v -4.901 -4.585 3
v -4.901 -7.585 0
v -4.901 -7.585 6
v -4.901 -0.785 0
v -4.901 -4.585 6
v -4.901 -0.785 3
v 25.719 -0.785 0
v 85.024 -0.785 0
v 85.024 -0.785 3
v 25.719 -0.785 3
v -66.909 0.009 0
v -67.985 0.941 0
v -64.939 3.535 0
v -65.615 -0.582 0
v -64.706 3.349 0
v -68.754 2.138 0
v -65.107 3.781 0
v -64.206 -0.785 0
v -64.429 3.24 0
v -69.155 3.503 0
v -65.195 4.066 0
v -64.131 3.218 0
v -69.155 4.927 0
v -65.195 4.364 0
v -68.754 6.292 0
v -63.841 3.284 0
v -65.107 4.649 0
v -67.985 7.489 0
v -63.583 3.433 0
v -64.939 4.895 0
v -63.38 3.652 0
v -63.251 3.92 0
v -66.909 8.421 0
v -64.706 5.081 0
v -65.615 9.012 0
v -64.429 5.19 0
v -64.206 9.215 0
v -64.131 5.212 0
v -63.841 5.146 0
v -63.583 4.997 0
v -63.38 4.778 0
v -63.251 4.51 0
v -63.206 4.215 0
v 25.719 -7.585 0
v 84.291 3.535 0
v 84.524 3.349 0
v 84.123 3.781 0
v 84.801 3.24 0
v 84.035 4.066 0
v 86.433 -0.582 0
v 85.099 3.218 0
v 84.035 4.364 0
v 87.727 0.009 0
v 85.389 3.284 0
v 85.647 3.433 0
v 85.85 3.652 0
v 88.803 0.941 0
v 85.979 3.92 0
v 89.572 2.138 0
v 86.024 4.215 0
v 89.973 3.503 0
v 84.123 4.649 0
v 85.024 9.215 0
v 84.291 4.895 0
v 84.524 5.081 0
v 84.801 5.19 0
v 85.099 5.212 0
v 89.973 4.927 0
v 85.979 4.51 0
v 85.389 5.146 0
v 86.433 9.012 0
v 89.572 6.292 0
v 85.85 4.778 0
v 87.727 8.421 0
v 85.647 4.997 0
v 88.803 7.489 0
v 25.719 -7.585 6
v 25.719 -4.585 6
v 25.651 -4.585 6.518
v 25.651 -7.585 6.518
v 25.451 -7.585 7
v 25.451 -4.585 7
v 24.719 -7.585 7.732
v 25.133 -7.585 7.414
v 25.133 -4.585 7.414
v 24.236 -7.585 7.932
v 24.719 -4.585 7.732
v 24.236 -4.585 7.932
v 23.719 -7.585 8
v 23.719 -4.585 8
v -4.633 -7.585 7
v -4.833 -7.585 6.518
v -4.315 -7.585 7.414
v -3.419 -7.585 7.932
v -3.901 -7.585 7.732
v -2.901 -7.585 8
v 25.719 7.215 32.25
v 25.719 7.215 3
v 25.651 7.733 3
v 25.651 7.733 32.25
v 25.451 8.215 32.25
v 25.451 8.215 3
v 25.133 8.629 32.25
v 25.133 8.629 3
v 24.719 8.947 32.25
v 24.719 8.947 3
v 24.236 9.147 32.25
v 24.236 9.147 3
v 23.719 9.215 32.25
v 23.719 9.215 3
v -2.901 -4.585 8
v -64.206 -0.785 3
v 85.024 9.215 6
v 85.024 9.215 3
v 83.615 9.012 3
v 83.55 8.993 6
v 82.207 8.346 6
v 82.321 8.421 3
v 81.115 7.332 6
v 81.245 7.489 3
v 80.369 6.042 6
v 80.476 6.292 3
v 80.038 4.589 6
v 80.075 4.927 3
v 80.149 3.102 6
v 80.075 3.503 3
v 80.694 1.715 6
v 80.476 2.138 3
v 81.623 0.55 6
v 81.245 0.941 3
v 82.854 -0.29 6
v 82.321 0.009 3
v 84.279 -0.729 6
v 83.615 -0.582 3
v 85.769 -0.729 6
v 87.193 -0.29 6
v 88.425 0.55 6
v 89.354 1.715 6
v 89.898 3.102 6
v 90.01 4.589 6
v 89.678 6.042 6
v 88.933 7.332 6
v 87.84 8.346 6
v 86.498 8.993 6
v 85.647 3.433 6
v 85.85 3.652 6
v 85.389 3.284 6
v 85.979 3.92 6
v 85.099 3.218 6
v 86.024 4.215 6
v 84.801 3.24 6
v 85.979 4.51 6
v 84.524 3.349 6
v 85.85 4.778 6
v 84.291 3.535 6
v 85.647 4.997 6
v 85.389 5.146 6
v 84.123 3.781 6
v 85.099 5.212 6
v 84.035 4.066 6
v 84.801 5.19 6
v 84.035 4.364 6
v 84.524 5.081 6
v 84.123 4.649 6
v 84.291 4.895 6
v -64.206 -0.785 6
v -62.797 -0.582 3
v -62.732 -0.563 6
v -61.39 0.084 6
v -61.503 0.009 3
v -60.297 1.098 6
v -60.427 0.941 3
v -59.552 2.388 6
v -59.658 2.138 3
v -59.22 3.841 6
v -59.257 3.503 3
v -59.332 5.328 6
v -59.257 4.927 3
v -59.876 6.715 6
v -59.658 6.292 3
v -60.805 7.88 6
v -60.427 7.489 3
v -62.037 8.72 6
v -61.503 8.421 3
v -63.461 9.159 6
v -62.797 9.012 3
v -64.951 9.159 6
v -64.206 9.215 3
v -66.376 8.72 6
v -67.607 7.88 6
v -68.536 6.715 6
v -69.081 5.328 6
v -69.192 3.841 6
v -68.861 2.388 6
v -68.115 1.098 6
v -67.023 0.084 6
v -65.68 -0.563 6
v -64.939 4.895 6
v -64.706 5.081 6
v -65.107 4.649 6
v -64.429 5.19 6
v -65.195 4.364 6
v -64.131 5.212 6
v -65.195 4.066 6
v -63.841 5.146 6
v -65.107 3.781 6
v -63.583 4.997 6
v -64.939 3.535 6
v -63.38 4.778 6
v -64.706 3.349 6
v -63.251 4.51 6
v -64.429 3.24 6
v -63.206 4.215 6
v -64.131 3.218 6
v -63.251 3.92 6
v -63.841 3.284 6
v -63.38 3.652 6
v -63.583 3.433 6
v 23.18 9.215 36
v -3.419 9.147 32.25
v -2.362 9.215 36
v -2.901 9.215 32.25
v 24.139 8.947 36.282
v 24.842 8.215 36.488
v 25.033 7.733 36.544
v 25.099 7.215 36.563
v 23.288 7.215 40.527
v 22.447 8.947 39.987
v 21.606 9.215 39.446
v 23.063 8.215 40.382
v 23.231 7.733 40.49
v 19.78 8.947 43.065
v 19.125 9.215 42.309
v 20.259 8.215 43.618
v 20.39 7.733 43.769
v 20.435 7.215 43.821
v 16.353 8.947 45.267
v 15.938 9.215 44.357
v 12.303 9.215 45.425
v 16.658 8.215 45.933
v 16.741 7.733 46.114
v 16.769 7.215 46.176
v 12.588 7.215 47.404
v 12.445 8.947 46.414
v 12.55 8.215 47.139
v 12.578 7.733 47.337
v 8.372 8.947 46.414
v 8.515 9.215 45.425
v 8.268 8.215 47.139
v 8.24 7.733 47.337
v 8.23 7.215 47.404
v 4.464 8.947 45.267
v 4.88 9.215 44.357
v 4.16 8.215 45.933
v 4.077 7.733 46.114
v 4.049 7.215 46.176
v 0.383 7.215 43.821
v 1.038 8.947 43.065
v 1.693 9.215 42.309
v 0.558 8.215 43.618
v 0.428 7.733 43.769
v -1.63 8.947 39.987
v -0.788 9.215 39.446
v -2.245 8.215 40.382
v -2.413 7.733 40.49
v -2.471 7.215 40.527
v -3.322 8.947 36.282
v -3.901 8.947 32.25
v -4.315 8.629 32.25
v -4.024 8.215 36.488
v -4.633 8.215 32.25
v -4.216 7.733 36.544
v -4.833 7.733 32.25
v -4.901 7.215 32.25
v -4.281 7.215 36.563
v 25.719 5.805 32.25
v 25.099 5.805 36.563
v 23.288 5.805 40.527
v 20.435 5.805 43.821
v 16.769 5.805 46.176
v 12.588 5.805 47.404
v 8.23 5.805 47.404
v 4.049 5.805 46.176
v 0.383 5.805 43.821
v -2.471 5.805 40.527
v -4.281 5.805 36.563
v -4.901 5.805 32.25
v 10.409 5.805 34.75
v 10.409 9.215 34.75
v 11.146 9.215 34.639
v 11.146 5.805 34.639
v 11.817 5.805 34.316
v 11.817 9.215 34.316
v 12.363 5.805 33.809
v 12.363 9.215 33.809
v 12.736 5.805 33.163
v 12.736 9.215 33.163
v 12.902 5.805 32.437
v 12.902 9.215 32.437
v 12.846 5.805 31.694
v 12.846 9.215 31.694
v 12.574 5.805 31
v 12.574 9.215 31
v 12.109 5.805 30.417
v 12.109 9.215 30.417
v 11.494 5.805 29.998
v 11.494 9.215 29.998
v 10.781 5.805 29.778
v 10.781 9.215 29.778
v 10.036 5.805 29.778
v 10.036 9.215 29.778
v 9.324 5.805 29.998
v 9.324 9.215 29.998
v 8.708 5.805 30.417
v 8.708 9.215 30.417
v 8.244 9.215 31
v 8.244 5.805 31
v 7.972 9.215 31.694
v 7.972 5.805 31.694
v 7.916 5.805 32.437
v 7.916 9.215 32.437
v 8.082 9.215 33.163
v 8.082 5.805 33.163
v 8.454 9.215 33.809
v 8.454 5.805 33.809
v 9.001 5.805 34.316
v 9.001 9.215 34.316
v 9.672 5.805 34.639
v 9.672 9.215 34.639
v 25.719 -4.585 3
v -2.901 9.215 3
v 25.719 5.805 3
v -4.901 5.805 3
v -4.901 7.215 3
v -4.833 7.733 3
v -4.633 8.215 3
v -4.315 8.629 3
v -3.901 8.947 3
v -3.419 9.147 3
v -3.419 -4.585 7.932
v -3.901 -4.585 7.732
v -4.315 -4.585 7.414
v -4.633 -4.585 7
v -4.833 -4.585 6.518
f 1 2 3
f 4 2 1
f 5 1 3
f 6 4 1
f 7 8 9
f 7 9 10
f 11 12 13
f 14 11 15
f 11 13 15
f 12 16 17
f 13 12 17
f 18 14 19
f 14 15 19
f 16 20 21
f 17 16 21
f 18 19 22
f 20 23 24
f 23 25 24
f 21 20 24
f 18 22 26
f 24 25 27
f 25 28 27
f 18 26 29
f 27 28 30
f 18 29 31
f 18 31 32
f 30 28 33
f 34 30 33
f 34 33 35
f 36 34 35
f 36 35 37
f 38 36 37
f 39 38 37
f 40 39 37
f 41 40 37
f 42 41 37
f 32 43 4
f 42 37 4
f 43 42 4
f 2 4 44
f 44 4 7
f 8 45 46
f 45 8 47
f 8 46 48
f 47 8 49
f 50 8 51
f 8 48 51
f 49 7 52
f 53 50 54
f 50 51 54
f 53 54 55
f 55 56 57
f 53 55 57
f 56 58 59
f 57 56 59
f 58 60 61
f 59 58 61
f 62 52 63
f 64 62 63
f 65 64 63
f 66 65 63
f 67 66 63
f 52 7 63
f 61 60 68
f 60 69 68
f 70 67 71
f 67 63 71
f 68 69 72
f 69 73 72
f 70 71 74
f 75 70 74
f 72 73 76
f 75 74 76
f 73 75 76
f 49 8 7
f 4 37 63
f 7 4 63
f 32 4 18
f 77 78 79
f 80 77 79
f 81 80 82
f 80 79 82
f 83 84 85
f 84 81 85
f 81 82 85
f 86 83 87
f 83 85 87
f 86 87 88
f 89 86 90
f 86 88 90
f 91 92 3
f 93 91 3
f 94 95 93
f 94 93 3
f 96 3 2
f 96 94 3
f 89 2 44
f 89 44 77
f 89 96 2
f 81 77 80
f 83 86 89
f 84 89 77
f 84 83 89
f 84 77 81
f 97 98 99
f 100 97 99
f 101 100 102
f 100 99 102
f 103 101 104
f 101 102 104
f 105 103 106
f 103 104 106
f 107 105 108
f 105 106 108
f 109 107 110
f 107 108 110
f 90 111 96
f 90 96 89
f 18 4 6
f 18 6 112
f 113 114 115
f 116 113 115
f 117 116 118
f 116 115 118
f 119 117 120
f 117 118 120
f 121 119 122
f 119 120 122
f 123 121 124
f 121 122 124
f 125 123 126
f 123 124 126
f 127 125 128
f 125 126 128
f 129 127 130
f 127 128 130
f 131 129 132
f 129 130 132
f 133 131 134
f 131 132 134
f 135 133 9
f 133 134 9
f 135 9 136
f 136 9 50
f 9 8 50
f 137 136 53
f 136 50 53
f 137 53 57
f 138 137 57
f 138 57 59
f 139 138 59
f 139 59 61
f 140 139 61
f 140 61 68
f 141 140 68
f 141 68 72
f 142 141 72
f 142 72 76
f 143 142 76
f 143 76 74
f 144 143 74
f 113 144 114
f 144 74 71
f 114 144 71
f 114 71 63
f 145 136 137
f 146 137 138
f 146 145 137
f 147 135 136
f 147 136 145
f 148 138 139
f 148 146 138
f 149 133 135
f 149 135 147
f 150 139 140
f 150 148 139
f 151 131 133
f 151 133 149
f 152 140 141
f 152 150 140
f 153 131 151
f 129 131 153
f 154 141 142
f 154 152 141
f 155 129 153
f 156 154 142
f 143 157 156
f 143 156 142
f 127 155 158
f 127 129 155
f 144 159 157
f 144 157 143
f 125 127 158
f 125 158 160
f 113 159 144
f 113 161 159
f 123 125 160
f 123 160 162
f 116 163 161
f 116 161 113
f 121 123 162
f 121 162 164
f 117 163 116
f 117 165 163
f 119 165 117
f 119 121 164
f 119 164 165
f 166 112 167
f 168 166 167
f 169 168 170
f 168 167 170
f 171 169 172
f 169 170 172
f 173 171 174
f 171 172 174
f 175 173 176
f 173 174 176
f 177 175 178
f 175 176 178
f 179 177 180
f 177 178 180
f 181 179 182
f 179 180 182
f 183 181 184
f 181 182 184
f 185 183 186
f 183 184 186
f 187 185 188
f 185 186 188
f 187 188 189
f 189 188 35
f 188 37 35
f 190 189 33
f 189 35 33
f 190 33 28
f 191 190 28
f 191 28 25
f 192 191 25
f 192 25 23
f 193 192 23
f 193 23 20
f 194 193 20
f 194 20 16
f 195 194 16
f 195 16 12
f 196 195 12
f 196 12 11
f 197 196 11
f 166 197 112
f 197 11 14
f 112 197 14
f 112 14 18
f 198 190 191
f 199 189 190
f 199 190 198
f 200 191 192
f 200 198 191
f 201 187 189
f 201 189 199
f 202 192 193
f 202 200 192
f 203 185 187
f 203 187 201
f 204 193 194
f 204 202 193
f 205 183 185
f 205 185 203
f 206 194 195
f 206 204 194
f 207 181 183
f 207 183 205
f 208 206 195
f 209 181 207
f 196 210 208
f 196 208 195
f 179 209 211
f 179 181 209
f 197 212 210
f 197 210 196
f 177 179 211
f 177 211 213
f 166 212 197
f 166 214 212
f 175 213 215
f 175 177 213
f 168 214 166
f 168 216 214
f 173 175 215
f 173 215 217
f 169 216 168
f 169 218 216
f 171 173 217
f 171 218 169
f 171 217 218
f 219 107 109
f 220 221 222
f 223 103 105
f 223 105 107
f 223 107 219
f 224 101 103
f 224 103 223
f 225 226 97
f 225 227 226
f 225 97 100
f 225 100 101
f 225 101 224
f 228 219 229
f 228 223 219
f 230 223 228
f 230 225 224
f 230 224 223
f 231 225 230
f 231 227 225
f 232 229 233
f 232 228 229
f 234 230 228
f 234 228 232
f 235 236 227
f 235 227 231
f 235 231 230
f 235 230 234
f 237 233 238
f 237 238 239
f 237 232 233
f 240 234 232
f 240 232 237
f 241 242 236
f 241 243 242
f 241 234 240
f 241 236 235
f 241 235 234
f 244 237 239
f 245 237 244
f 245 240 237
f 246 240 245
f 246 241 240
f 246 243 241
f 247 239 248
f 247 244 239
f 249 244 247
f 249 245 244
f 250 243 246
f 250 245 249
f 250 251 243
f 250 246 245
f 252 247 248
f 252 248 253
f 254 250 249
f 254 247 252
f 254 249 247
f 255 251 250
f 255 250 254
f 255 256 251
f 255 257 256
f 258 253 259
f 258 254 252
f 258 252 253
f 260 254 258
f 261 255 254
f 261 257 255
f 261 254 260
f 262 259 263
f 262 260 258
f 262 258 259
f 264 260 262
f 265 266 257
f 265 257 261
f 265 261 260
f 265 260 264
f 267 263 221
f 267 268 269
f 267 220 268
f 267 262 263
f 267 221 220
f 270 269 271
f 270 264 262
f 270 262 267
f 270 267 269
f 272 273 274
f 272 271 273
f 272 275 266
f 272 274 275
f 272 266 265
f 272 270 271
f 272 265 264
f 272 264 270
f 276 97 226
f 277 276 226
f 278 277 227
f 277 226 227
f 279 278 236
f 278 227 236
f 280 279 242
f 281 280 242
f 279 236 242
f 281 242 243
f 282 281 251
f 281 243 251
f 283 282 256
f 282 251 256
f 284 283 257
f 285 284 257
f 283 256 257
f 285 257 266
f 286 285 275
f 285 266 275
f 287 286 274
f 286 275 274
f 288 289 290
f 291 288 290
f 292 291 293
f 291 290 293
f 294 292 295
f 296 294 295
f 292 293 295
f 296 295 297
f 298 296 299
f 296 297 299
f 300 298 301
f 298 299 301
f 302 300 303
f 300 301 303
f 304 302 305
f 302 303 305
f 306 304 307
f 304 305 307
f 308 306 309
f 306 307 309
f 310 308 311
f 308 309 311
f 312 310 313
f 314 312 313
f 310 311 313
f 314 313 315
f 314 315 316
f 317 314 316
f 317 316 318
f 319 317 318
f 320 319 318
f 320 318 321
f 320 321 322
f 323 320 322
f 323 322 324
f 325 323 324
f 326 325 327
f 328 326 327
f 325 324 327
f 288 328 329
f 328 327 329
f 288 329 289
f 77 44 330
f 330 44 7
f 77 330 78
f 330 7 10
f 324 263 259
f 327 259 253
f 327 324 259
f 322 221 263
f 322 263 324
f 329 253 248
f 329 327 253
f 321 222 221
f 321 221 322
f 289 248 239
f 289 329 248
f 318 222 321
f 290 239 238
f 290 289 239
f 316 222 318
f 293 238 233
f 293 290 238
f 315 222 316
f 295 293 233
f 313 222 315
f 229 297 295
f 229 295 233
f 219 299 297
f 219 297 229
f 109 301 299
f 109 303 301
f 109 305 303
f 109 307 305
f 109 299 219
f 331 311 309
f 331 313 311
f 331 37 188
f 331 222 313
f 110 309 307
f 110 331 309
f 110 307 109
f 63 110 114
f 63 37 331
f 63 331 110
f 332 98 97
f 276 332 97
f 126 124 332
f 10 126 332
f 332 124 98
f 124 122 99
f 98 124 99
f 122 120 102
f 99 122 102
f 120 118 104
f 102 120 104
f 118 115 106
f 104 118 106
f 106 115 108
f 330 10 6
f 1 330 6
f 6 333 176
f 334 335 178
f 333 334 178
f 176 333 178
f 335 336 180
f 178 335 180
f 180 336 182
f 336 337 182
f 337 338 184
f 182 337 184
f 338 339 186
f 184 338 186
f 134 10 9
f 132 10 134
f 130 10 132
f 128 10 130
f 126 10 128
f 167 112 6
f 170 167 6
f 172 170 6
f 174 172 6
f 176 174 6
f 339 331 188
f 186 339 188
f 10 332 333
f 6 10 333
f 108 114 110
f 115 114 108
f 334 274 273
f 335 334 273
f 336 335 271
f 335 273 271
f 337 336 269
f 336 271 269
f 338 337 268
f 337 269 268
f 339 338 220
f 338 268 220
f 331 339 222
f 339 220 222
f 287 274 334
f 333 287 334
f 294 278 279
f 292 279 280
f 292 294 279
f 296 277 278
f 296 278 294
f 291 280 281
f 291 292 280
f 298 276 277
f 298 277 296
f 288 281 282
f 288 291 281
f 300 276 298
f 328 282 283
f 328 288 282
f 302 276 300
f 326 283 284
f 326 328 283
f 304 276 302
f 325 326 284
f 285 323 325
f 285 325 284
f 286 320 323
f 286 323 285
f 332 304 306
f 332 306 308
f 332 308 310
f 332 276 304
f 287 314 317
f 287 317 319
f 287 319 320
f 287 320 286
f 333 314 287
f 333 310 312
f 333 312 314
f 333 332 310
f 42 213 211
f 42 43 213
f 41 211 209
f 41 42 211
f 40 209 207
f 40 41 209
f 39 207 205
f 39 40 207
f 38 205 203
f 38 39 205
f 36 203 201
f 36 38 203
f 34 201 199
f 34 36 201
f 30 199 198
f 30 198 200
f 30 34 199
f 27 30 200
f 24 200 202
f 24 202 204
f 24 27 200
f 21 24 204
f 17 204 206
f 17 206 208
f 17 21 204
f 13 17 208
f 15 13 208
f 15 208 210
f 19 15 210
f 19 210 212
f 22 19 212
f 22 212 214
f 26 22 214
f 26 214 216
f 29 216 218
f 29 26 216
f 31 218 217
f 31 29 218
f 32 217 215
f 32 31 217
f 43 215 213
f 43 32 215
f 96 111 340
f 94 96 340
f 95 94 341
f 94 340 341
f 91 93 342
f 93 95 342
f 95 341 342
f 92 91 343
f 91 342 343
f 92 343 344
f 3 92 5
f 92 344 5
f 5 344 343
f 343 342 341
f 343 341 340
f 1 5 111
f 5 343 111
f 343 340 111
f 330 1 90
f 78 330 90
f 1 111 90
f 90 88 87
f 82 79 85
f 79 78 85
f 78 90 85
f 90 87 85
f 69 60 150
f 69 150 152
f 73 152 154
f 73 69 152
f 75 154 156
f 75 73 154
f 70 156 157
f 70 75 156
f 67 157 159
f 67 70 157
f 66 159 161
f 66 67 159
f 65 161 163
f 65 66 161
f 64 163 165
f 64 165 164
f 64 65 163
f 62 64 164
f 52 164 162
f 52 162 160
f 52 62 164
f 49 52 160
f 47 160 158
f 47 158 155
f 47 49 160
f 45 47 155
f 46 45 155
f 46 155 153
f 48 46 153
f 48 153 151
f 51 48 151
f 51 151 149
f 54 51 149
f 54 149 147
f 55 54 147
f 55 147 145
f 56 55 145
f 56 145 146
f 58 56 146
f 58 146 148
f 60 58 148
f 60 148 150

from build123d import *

# Parameters (mm, degrees)
BOSS_EXTRUDE1_DEPTH = 3
SKETCH2_R           = 5
SKETCH2_R_2         = 1
BOSS_EXTRUDE2_DEPTH = 3
CUT_EXTRUDE1_START  = -10
SKETCH7_R           = 1
CUT_EXTRUDE1_DEPTH  = 10
CUT_EXTRUDE2_START  = -10
SKETCH8_R           = 1
CUT_EXTRUDE2_DEPTH  = 10
SKETCH5_R           = 2.5
BOSS_EXTRUDE3_DEPTH = 3.41
SKETCH9_W           = 30.62
SKETCH9_H           = 3
BOSS_EXTRUDE4_DEPTH = 3.8
SKETCH10_W          = 30.62
SKETCH10_H          = 8
BOSS_EXTRUDE5_DEPTH = 3
FILLET3_R           = 2


with BuildPart() as part:
    # Sketch1 → Boss-Extrude1 (new body)
    with BuildSketch(Plane.XY):
        with BuildLine():
            Line((-64.206162528, 9.215011287), (85.023837472, 9.215011287))
            ThreePointArc((85.023837472, 9.215011287), (90.023837472, 4.215011287), (85.023837472, -0.784988713))
            Line((85.023837472, -0.784988713), (-64.206162528, -0.784988713))
            ThreePointArc((-64.206162528, -0.784988713), (-69.206162528, 4.215011287), (-64.206162528, 9.215011287))
        make_face()
    extrude(amount=BOSS_EXTRUDE1_DEPTH)

    # Sketch2 → Boss-Extrude2 (add)
    # profile 1 of 2: a face of its own
    with BuildSketch(Plane.XY.offset(3)):
        with Locations(Location((-64.206162528, 4.215011287, 0), (0, 0, 270))):
            Circle(SKETCH2_R)
        with Locations((-64.206162528, 4.215011287)):
            Circle(SKETCH2_R_2, mode=Mode.SUBTRACT)
    # profile 2 of 2: a face of its own
    with BuildSketch(Plane.XY.offset(3)):
        with Locations(Location((85.023837472, 4.215011287, 0), (0, 0, 90))):
            Circle(SKETCH2_R)
        with Locations((85.023837472, 4.215011287)):
            Circle(SKETCH2_R_2, mode=Mode.SUBTRACT)
    extrude(amount=BOSS_EXTRUDE2_DEPTH)

    # Sketch7 → Cut-Extrude1 (cut)
    with BuildSketch(Plane.XY.offset(6).offset(CUT_EXTRUDE1_START)):
        with Locations((-64.206162528, 4.215011287)):
            Circle(SKETCH7_R)
    extrude(amount=CUT_EXTRUDE1_DEPTH, mode=Mode.SUBTRACT)

    # Sketch8 → Cut-Extrude2 (cut)
    with BuildSketch(Plane.XY.offset(6).offset(CUT_EXTRUDE2_START)):
        with Locations((85.023837472, 4.215011287)):
            Circle(SKETCH8_R)
    extrude(amount=CUT_EXTRUDE2_DEPTH, mode=Mode.SUBTRACT)

    # Sketch5 → Boss-Extrude3 (add)
    with BuildSketch(Plane(origin=(0, 9.215011287, 0), x_dir=(1, 0, 0), z_dir=(0, 1, 0))):
        with BuildLine():
            Line((-4.901162528, -3), (25.718837472, -3))
            Line((25.718837472, -3), (25.718837472, -16.94))
            Line((25.718837472, -16.94), (25.718837472, -32.25))
            ThreePointArc((25.718837472, -32.25), (10.408837472, -47.56), (-4.901162528, -32.25))
            Line((-4.901162528, -32.25), (-4.901162528, -16.94))
            Line((-4.901162528, -16.94), (-4.901162528, -3))
        make_face()
        with Locations(Location((10.408837472, -32.25, 0), (0, 0, 270))):
            Circle(SKETCH5_R, mode=Mode.SUBTRACT)
    extrude(amount=-BOSS_EXTRUDE3_DEPTH)

    # Sketch9 → Boss-Extrude4 (add)
    with BuildSketch(Plane.XZ.offset(0.784988713)):
        with Locations((10.408837472, 1.5)):
            Rectangle(SKETCH9_W, SKETCH9_H)
    extrude(amount=BOSS_EXTRUDE4_DEPTH)

    # Sketch10 → Boss-Extrude5 (add)
    with BuildSketch(Plane.XZ.offset(4.584988713)):
        with Locations((10.408837472, 4)):
            Rectangle(SKETCH10_W, SKETCH10_H)
    extrude(amount=BOSS_EXTRUDE5_DEPTH)

    # Fillet3
    # the kernel refuses this fillet: 2 mm, written as the material it takes off along each edge
    with BuildSketch(Plane(origin=(25.718837472, 9.215011287, 3), x_dir=(-1, 0, 0), z_dir=(0, 0, 1)), Plane(origin=(-4.901162528, 9.215011287, 32.25), x_dir=(1, 0, 0), z_dir=(0, 0, -1))) as fillet3_piece_1:
        with BuildLine():
            CenterArc((FILLET3_R, FILLET3_R), FILLET3_R, 180, 90)
            Line((0, FILLET3_R), (0, 0))
            Line((0, 0), (FILLET3_R, 0))
        make_face()
    extrude(amount=29.25, mode=Mode.SUBTRACT)
    with BuildSketch(Plane(origin=(10.408837472, 9.215011287, 32.25), x_dir=(1, 0, 0), z_dir=(0, 0, -1))) as fillet3_piece_2:
        with BuildLine():
            CenterArc((15.31 - FILLET3_R, FILLET3_R), FILLET3_R, 270, 90)
            Line((15.31, FILLET3_R), (15.31, 0))
            Line((15.31, 0), (15.31 - FILLET3_R, 0))
        make_face()
    revolve(axis=Axis((10.408837472, 9.215011287, 32.25), (0, -1, 0)), revolution_arc=180, mode=Mode.SUBTRACT)
    with BuildSketch(Plane(origin=(-4.901162528, 0.415011287, 8), x_dir=(0, 0, -1), z_dir=(0, -1, 0)), Plane(origin=(25.718837472, 0.415011287, 8), x_dir=(-1, 0, 0), z_dir=(0, -1, 0))) as fillet3_piece_3:
        with BuildLine():
            CenterArc((FILLET3_R, FILLET3_R), FILLET3_R, 180, 90)
            Line((0, FILLET3_R), (0, 0))
            Line((0, 0), (FILLET3_R, 0))
        make_face()
    extrude(amount=13, mode=Mode.SUBTRACT)


solid = part.part
